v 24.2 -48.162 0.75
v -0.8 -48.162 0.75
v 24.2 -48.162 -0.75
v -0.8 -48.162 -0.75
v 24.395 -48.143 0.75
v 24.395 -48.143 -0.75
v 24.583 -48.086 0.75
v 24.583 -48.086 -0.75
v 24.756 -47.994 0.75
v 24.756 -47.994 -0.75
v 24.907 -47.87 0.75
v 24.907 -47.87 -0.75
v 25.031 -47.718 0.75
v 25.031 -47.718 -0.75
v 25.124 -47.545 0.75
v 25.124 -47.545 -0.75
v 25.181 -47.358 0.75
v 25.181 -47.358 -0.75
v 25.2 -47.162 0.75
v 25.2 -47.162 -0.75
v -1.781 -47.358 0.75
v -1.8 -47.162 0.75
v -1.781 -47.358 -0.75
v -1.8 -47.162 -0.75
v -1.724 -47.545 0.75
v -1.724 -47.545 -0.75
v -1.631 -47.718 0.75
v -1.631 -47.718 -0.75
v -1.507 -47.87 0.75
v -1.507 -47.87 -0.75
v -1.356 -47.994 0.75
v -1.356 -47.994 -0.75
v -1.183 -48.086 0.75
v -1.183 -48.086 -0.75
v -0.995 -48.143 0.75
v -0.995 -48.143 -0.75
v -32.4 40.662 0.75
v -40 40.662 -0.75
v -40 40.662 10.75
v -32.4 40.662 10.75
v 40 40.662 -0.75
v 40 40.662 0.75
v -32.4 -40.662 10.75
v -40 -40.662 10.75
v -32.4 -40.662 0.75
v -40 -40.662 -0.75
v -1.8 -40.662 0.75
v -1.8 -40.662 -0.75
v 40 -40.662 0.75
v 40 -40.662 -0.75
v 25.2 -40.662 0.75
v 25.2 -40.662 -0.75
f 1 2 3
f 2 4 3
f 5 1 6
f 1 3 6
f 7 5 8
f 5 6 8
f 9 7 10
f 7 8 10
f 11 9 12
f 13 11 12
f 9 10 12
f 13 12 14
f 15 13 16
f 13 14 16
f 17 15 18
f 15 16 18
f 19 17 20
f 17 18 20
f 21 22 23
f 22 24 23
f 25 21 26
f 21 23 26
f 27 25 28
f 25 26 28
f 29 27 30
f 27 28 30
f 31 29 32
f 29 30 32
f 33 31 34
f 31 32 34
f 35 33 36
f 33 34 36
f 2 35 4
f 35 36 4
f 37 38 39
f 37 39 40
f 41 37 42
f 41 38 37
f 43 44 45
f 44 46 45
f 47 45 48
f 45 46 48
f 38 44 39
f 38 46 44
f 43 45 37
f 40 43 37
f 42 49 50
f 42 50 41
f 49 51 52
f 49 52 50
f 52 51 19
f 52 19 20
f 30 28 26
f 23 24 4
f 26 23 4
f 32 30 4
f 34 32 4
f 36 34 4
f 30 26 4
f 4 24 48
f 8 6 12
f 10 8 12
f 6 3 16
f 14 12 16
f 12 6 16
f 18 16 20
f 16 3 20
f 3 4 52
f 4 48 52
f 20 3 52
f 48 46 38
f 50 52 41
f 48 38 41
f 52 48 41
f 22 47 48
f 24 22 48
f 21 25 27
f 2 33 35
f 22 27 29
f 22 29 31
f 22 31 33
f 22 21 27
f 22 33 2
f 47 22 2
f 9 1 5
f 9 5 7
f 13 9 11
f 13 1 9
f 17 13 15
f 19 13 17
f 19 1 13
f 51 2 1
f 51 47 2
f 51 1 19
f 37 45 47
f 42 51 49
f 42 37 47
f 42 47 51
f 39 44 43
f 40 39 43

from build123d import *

# Parameters (mm, degrees)
F0_W     = 80
F0_H     = 81.325
F1_DEPTH = 0.75
F3_E1_W  = 27
F3_E1_H  = 1.5
F4_DEPTH = 7.5
F5_R     = 1
F7_W     = 7.6
F7_H     = 81.325
F8_DEPTH = 10


# Not quite as in the source:
# - two fillets or chamfers of one size are made in one step


with BuildPart() as f1:
    # F0 (on Top) → F1 (new body, symmetric)
    with BuildSketch(Plane.XY):
        Rectangle(F0_W, F0_H)
    extrude(amount=F1_DEPTH, both=True)

    # F3_E1 (on explicit) → F4 (join)
    with BuildSketch(Plane(origin=(-1.8, -40.6625, 0.75), x_dir=(1, 0, 0), z_dir=(0, 1, 0))):
        with Locations((13.5, 0.75)):
            Rectangle(F3_E1_W, F3_E1_H)
    extrude(amount=-F4_DEPTH)

    # F5
    f5_edges = [f1.edges().sort_by_distance(p)[0] for p in [
        (-1.8, -48.1625, 0),
        (25.2, -48.1625, 0),
    ]]
    fillet(f5_edges, radius=F5_R)

    # F7 (on face) → F8 (join)
    with BuildSketch(Plane.XY.offset(0.75)):
        with Locations((-36.2, 0)):
            Rectangle(F7_W, F7_H)
    extrude(amount=F8_DEPTH)


solid = f1.part
